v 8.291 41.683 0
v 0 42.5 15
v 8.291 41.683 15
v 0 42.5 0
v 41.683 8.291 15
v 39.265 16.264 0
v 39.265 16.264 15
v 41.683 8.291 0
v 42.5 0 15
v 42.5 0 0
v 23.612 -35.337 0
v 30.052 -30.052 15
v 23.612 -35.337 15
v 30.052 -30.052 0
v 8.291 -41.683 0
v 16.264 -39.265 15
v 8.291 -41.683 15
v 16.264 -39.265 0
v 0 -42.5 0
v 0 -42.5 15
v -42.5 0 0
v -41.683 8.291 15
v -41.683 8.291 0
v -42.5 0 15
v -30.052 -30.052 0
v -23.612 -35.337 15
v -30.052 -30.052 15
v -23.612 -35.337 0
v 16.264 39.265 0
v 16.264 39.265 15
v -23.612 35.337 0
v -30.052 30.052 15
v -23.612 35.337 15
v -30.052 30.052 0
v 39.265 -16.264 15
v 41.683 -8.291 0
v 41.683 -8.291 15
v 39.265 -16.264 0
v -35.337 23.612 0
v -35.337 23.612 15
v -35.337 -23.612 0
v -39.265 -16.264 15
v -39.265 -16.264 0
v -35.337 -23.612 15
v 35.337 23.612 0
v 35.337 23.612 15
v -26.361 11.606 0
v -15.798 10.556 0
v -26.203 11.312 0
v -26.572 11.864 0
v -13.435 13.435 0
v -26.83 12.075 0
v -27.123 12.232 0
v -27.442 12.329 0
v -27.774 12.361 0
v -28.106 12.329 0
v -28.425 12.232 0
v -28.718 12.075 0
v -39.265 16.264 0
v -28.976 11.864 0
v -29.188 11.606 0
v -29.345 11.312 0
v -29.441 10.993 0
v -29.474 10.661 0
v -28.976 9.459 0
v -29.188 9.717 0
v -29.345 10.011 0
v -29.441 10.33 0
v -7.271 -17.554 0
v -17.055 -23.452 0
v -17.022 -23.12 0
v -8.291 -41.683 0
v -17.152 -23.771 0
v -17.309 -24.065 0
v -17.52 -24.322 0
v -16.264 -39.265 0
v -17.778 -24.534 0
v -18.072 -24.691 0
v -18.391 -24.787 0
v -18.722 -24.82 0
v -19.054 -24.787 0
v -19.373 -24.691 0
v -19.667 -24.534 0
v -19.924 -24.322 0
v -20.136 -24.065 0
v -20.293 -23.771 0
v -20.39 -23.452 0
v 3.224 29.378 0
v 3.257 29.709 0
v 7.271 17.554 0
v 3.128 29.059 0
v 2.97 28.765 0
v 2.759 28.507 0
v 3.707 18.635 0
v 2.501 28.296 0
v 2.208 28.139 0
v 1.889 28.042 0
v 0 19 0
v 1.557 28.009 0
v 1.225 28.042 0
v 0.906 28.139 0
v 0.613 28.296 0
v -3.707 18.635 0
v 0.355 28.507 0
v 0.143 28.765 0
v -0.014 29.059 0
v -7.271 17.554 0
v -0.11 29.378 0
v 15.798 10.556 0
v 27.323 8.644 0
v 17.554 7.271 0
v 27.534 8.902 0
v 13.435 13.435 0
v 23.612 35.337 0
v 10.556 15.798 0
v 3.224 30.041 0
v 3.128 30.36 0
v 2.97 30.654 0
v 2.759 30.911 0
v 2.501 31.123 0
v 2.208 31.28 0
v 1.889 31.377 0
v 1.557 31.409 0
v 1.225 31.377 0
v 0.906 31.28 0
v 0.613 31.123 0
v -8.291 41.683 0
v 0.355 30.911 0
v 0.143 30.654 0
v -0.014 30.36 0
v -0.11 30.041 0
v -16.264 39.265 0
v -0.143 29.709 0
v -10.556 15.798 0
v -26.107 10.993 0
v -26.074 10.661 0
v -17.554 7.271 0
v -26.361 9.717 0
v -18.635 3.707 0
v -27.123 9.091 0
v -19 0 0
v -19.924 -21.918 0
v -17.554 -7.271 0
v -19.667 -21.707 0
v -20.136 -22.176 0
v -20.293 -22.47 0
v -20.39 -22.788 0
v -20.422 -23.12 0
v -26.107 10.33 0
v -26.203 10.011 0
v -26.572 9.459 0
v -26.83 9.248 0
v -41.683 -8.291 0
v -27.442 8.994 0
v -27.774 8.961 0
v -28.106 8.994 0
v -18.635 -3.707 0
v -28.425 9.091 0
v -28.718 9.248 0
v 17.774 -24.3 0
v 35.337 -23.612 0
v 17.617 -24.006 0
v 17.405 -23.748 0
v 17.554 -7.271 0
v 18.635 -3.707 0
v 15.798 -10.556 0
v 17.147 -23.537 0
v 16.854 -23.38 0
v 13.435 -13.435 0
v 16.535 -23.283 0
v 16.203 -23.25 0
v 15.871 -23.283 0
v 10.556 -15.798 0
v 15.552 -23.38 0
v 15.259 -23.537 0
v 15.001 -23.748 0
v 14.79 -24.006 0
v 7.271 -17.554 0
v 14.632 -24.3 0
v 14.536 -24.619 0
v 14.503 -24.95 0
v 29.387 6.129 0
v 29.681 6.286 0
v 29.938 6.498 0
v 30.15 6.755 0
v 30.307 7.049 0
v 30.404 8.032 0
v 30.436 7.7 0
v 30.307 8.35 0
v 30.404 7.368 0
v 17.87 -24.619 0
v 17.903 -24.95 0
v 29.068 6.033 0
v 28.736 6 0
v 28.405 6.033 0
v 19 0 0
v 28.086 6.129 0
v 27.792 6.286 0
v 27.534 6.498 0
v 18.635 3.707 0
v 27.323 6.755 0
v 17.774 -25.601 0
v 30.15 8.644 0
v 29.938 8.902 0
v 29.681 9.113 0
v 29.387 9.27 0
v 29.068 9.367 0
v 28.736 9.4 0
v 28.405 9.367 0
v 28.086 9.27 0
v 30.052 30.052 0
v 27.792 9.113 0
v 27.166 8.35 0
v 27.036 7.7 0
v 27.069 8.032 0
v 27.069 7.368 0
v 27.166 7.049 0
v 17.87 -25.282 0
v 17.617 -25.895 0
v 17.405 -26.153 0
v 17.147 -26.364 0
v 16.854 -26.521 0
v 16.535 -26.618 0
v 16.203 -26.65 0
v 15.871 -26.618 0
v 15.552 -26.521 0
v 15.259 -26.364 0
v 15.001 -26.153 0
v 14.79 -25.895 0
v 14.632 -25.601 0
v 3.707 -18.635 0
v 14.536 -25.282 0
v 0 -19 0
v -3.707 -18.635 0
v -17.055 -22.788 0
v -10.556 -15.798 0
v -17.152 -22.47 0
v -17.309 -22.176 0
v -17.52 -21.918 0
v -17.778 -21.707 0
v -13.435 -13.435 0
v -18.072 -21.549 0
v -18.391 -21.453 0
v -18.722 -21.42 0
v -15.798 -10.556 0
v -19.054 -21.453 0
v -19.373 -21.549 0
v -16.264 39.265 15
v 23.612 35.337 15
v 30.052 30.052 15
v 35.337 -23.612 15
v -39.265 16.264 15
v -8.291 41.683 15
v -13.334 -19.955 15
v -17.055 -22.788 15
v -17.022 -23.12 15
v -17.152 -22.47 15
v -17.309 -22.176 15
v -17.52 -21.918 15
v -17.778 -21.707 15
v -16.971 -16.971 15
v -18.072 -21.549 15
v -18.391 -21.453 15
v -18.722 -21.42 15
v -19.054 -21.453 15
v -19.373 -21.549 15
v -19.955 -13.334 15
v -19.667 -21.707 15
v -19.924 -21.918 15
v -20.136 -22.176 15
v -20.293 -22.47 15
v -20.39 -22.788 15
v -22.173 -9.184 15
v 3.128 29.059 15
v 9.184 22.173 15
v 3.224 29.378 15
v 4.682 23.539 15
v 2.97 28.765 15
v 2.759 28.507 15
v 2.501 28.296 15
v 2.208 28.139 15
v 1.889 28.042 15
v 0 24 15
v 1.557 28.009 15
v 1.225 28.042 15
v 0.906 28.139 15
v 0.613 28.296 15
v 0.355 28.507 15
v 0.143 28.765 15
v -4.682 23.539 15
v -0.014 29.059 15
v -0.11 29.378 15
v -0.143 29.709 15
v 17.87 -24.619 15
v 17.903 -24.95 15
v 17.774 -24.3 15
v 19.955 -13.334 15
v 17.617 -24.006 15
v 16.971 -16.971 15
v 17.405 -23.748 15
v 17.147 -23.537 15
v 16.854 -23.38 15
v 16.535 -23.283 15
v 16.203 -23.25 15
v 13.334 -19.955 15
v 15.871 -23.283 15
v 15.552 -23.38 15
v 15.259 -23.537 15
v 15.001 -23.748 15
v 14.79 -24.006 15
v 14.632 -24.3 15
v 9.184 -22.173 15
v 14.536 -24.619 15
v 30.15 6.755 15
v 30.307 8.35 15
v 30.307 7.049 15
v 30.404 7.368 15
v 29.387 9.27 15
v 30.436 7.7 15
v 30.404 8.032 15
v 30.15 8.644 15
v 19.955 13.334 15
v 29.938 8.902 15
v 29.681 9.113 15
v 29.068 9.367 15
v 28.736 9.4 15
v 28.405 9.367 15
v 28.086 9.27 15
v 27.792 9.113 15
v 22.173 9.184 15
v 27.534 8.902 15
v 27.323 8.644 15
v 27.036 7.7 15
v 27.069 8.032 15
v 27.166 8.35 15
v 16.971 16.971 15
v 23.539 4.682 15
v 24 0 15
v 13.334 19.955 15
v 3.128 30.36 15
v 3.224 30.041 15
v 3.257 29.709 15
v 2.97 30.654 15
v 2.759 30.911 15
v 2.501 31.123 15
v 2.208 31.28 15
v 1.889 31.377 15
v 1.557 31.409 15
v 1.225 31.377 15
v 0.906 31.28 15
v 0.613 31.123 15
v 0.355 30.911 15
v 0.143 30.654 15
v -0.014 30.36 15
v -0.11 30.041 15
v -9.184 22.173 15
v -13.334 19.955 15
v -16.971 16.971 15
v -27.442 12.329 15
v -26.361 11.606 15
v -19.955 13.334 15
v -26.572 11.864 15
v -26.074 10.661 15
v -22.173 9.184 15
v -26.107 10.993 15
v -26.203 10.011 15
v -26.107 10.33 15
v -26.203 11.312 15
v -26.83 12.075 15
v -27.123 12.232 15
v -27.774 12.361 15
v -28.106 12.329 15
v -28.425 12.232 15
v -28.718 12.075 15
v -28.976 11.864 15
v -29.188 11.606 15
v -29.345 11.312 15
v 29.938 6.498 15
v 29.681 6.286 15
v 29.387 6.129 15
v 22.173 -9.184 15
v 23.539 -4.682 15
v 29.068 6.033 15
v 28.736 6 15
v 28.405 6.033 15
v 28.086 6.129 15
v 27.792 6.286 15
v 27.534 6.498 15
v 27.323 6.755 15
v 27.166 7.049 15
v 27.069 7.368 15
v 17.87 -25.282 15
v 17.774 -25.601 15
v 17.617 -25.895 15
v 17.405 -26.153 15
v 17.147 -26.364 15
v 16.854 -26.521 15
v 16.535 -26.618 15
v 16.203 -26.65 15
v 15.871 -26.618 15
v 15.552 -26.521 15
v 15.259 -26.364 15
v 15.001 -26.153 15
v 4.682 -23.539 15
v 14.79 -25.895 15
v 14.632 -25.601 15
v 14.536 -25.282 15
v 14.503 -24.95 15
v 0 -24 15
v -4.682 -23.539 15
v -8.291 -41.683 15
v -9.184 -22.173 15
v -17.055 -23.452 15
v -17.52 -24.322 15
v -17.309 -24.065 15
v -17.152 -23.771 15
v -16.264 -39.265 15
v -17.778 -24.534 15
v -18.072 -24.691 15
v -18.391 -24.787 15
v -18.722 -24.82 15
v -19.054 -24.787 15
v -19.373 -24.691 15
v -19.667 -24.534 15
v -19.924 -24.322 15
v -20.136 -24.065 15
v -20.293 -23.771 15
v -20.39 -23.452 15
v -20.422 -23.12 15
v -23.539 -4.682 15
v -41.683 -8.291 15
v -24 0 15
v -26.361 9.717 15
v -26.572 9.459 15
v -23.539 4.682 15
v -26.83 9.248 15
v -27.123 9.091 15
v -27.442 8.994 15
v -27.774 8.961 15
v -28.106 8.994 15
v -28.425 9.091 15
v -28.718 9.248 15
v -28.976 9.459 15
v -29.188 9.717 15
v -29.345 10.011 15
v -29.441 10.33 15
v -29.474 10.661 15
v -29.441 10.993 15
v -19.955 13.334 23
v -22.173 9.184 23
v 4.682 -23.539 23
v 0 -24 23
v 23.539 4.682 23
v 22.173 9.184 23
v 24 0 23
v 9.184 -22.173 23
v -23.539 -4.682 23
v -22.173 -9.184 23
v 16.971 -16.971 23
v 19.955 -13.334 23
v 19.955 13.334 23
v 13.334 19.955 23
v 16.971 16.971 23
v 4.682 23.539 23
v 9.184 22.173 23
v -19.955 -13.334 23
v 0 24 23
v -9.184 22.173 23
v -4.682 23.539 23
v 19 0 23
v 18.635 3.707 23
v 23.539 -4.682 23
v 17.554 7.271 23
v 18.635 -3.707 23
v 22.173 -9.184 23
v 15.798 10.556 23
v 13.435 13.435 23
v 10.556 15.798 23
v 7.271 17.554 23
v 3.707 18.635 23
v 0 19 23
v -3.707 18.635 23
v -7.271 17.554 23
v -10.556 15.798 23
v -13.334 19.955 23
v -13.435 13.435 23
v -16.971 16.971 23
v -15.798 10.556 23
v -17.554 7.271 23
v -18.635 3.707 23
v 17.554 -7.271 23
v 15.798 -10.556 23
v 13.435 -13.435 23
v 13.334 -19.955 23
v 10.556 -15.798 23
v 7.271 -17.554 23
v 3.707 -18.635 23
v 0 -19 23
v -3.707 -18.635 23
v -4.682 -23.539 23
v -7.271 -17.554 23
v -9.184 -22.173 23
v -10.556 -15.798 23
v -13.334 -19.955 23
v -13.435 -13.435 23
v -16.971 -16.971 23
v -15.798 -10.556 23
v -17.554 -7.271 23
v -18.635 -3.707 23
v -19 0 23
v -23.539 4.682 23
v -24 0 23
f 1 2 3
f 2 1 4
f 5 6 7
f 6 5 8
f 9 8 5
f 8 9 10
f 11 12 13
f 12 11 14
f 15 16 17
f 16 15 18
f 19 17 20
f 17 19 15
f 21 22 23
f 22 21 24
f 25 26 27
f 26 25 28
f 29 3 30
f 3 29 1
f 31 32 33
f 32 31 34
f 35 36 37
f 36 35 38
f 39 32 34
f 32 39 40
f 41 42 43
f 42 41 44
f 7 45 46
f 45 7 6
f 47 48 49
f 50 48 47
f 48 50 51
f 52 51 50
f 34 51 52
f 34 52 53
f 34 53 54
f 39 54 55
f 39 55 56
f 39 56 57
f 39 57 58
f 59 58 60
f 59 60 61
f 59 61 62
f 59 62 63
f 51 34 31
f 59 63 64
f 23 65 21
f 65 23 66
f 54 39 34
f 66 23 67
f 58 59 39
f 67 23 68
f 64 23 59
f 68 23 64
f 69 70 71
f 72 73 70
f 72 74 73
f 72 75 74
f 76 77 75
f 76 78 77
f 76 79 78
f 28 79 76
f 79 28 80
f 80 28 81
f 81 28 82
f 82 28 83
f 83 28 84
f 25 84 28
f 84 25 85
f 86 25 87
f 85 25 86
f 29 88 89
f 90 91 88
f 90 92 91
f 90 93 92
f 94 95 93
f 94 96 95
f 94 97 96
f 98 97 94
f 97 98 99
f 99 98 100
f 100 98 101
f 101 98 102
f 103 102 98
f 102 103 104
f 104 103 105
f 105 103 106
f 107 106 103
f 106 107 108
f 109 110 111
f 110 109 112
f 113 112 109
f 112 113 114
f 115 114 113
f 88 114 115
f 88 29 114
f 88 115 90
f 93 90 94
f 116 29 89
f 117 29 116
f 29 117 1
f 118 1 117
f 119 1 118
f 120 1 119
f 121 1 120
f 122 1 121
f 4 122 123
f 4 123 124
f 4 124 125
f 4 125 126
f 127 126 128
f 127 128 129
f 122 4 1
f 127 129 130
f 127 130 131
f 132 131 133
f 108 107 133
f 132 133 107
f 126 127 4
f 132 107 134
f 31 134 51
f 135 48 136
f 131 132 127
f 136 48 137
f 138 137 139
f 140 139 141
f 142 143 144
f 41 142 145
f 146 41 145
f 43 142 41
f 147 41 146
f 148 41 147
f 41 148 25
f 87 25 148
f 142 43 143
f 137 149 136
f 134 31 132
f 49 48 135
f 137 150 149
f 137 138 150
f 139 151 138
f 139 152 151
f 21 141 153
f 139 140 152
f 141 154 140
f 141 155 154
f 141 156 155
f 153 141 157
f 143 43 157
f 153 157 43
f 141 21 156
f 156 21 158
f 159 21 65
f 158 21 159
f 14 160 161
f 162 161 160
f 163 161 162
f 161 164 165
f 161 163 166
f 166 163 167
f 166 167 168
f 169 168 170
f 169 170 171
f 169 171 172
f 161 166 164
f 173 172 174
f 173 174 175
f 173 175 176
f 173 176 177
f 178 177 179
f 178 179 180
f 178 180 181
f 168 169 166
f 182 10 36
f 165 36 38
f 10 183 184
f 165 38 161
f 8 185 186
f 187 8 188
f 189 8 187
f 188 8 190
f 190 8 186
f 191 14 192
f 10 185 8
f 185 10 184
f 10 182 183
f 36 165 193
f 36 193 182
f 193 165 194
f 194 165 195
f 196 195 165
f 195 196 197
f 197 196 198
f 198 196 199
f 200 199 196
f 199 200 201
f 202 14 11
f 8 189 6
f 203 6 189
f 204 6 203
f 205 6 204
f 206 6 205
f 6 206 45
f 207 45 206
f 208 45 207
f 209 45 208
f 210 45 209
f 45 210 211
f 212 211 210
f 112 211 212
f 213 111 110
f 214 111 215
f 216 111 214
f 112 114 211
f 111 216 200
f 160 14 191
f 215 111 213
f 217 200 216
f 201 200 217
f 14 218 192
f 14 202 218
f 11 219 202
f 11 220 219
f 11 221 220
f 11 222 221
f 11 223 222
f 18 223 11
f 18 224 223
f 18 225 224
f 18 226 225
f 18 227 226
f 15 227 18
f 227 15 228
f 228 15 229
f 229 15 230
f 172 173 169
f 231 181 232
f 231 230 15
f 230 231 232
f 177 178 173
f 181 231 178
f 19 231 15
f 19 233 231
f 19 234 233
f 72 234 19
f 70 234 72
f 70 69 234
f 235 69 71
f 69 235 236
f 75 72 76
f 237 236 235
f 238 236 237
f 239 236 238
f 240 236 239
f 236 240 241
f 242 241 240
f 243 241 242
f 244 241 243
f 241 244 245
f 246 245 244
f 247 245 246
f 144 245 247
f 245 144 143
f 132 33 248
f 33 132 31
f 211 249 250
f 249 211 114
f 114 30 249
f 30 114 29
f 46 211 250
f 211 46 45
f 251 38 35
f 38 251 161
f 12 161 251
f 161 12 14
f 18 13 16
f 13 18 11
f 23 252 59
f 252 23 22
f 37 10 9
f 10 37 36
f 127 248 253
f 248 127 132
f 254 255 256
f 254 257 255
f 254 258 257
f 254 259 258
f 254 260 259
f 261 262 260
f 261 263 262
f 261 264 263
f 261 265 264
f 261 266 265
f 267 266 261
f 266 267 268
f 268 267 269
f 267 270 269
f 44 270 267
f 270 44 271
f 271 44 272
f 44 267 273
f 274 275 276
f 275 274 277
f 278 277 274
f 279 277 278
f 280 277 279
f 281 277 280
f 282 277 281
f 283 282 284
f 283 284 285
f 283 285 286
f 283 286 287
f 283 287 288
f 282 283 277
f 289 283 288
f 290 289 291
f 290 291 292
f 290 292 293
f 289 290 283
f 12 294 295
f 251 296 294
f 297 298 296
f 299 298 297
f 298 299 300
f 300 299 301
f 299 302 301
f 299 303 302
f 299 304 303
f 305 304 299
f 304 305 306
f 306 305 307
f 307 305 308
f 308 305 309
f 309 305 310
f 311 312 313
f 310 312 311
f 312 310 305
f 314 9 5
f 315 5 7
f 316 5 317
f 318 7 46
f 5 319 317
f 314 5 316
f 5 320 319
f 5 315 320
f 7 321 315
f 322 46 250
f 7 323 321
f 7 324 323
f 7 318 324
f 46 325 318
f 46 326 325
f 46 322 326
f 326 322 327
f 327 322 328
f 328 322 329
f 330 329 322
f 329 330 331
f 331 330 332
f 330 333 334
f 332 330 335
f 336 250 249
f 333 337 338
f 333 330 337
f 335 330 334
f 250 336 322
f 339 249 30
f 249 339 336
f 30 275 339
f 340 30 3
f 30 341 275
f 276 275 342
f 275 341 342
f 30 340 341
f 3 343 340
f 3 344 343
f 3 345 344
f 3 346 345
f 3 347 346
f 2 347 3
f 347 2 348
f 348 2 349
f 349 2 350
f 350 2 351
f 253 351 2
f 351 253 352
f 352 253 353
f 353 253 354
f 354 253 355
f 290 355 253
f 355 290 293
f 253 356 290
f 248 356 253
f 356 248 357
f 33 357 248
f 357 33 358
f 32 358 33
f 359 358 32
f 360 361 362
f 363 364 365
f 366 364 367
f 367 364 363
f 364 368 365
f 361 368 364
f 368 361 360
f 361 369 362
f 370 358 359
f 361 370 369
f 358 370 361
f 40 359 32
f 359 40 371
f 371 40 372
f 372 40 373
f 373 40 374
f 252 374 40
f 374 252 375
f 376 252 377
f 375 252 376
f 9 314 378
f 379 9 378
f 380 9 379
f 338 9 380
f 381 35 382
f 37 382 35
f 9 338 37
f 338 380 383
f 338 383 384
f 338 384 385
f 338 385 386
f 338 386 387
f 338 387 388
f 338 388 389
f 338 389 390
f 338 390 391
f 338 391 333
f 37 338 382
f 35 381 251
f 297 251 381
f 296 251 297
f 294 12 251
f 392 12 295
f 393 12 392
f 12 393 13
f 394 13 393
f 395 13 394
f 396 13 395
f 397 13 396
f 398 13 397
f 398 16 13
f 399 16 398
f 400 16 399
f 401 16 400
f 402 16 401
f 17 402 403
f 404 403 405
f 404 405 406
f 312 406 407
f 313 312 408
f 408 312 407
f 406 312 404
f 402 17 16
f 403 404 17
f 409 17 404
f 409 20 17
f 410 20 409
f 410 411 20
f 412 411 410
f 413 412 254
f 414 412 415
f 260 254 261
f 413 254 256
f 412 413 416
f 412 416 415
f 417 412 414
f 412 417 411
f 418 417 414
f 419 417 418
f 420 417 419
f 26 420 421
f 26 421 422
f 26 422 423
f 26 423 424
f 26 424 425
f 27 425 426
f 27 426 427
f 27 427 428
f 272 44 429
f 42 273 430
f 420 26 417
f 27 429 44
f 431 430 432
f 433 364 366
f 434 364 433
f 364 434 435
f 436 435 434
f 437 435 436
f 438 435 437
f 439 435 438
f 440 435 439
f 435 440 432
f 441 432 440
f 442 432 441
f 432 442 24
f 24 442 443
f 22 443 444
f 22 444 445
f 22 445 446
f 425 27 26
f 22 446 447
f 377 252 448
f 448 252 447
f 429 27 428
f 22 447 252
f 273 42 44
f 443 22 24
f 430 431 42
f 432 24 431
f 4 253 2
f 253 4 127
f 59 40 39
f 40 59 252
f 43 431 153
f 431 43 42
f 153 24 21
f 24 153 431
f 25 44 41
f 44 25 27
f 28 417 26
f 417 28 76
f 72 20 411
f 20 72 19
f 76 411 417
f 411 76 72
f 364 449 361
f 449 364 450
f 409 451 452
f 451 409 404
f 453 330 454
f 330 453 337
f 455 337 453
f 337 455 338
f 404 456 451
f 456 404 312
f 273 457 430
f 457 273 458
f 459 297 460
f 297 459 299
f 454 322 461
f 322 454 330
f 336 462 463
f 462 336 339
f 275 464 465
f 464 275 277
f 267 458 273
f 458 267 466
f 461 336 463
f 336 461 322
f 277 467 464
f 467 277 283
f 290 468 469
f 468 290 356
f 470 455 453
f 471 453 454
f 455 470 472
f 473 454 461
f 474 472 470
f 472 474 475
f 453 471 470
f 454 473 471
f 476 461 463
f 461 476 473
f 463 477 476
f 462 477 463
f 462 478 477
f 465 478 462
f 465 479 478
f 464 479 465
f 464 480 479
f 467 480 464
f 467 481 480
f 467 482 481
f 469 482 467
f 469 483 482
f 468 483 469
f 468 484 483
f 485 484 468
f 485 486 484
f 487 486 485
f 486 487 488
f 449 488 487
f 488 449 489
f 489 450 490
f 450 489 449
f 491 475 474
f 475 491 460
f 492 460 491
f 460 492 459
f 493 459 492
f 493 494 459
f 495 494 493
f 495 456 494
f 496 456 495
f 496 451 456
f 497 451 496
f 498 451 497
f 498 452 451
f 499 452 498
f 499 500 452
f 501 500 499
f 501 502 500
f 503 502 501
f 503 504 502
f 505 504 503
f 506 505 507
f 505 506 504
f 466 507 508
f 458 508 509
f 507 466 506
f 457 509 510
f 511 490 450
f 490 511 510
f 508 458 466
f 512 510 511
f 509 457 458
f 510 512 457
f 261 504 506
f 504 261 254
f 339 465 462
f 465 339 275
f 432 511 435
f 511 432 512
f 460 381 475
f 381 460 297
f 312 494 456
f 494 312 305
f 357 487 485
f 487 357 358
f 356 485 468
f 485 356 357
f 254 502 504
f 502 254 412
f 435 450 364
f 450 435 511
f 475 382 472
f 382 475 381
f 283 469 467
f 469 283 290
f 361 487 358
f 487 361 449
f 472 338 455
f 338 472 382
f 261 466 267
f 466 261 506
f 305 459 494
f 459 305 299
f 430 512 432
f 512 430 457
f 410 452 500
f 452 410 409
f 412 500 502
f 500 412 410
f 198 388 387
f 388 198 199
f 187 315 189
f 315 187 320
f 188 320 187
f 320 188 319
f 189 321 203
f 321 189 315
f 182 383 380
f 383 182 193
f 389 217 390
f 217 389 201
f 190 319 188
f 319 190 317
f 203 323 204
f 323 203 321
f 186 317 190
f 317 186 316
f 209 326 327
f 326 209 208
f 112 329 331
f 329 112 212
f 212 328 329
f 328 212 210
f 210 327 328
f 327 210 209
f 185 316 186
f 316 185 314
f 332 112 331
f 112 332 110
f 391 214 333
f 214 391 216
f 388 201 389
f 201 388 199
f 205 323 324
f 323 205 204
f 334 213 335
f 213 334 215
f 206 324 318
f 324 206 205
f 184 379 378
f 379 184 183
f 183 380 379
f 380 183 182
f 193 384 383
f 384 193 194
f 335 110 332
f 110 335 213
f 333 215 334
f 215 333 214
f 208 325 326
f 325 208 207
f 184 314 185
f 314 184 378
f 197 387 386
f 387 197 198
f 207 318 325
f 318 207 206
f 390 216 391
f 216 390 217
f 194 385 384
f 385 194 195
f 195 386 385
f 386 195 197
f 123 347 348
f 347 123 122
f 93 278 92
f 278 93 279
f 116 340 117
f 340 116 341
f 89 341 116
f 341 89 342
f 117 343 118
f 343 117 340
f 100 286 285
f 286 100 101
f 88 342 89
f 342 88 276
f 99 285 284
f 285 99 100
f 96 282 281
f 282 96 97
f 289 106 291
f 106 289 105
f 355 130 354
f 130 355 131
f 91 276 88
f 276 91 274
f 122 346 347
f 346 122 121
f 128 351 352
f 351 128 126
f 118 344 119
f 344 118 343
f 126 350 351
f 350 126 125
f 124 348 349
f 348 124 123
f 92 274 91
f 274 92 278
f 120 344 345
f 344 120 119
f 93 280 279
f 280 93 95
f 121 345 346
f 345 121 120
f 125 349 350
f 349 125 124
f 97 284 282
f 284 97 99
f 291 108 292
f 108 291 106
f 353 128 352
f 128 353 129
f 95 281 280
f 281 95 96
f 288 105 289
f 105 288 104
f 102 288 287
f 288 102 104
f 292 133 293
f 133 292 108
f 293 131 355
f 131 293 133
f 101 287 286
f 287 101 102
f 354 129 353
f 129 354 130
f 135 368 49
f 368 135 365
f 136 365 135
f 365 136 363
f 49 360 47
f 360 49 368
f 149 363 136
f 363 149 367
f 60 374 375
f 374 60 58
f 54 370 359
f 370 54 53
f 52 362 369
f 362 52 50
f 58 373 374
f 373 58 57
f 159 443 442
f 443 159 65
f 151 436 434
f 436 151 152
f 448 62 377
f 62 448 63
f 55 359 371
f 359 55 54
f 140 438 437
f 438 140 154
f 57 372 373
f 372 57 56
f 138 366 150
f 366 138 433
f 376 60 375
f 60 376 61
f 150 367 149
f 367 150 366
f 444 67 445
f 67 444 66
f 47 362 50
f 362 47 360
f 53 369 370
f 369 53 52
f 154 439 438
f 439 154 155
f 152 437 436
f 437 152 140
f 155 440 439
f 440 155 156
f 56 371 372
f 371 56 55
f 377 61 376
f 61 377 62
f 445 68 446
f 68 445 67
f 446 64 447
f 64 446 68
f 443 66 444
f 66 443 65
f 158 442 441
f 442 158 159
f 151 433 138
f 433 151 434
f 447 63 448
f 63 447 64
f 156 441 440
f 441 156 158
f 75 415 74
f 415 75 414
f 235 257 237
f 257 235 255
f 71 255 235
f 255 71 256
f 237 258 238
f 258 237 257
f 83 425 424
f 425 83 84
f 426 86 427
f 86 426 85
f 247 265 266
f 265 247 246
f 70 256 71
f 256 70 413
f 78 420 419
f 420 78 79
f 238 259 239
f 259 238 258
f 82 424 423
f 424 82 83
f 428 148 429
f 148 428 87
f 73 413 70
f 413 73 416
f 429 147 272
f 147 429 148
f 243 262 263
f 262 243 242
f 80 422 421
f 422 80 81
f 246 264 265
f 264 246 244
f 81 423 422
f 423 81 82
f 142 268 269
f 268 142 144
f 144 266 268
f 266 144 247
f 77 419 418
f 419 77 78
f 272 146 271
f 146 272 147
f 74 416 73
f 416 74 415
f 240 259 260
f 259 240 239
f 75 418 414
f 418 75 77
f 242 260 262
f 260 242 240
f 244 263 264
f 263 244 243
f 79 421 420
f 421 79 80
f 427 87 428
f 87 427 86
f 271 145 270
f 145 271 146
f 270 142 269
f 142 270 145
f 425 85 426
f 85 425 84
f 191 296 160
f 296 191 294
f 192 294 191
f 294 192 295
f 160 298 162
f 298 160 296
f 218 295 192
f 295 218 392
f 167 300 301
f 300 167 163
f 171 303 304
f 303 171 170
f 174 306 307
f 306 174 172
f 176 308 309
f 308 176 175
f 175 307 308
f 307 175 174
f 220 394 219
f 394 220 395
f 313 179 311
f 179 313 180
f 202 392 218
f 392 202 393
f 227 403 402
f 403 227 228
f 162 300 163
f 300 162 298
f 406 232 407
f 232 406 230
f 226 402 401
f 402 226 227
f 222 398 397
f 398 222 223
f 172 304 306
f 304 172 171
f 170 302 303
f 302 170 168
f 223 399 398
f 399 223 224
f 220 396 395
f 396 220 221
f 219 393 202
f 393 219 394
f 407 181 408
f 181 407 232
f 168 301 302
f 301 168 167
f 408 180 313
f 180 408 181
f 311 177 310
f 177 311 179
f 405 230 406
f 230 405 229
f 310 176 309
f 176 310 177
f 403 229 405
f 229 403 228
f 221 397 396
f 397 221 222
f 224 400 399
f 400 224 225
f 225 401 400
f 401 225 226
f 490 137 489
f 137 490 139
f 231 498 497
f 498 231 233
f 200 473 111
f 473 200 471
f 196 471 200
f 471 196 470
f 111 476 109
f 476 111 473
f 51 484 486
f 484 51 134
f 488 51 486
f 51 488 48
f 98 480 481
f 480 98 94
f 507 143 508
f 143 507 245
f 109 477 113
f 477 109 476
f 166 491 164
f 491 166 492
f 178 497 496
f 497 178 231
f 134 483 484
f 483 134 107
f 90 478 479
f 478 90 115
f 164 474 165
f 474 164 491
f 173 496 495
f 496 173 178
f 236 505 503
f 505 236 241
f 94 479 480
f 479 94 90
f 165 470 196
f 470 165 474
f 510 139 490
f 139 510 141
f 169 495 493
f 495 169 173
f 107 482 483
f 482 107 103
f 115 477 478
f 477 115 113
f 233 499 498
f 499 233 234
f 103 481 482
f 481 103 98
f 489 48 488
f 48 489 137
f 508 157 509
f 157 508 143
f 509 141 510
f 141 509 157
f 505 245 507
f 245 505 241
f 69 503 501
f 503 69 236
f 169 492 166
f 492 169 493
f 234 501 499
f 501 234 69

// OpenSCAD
$fn = 32;

// ----------------------------------------------------------------------
// Flange Ø85 x 15
// 5 holes on a Ø59.5 bolt circle, bolted joints
// ----------------------------------------------------------------------

// --- parameters (mm) ---
flange_d = 85;   // outside diameter of the flange
thickness = 15;  // flange thickness
holes = 5;       // number of bolt holes
pcd = 59.5;      // bolt circle diameter
start_deg = 15;  // angle of the first hole, from +X
hole_d = 3.4;    // bolt hole diameter
bore_d = 38;     // central through bore
hub_d = 48;      // hub outside diameter
hub_h = 8;       // hub height above the flange face (0 = no hub)

// --- derived feature positions (mm) ---
height = thickness + hub_h;  // = 23   overall height of the part
pcd_r = pcd / 2;             // = 29.75   bolt circle radius
hole_step = 360 / holes;     // = 72   angular pitch
feature_centers = [
  [pcd_r * cos(start_deg + 0 * hole_step), pcd_r * sin(start_deg + 0 * hole_step)],
  [pcd_r * cos(start_deg + 1 * hole_step), pcd_r * sin(start_deg + 1 * hole_step)],
  [pcd_r * cos(start_deg + 2 * hole_step), pcd_r * sin(start_deg + 2 * hole_step)],
  [pcd_r * cos(start_deg + 3 * hole_step), pcd_r * sin(start_deg + 3 * hole_step)],
  [pcd_r * cos(start_deg + 4 * hole_step), pcd_r * sin(start_deg + 4 * hole_step)]
];   // bolt hole centres on the pitch circle

// flange disc, every hole and the bore cut straight through
difference() {
  union() {
    cylinder(d = flange_d, h = thickness);
    cylinder(d = hub_d, h = height);  // hub, overlapped into the flange
  }
  translate([0, 0, -1]) cylinder(d = bore_d, h = height + 2);  // bore, through
  for (centre = feature_centers)
    translate([centre[0], centre[1], -1]) cylinder(d = hole_d, h = thickness + 2);
}
